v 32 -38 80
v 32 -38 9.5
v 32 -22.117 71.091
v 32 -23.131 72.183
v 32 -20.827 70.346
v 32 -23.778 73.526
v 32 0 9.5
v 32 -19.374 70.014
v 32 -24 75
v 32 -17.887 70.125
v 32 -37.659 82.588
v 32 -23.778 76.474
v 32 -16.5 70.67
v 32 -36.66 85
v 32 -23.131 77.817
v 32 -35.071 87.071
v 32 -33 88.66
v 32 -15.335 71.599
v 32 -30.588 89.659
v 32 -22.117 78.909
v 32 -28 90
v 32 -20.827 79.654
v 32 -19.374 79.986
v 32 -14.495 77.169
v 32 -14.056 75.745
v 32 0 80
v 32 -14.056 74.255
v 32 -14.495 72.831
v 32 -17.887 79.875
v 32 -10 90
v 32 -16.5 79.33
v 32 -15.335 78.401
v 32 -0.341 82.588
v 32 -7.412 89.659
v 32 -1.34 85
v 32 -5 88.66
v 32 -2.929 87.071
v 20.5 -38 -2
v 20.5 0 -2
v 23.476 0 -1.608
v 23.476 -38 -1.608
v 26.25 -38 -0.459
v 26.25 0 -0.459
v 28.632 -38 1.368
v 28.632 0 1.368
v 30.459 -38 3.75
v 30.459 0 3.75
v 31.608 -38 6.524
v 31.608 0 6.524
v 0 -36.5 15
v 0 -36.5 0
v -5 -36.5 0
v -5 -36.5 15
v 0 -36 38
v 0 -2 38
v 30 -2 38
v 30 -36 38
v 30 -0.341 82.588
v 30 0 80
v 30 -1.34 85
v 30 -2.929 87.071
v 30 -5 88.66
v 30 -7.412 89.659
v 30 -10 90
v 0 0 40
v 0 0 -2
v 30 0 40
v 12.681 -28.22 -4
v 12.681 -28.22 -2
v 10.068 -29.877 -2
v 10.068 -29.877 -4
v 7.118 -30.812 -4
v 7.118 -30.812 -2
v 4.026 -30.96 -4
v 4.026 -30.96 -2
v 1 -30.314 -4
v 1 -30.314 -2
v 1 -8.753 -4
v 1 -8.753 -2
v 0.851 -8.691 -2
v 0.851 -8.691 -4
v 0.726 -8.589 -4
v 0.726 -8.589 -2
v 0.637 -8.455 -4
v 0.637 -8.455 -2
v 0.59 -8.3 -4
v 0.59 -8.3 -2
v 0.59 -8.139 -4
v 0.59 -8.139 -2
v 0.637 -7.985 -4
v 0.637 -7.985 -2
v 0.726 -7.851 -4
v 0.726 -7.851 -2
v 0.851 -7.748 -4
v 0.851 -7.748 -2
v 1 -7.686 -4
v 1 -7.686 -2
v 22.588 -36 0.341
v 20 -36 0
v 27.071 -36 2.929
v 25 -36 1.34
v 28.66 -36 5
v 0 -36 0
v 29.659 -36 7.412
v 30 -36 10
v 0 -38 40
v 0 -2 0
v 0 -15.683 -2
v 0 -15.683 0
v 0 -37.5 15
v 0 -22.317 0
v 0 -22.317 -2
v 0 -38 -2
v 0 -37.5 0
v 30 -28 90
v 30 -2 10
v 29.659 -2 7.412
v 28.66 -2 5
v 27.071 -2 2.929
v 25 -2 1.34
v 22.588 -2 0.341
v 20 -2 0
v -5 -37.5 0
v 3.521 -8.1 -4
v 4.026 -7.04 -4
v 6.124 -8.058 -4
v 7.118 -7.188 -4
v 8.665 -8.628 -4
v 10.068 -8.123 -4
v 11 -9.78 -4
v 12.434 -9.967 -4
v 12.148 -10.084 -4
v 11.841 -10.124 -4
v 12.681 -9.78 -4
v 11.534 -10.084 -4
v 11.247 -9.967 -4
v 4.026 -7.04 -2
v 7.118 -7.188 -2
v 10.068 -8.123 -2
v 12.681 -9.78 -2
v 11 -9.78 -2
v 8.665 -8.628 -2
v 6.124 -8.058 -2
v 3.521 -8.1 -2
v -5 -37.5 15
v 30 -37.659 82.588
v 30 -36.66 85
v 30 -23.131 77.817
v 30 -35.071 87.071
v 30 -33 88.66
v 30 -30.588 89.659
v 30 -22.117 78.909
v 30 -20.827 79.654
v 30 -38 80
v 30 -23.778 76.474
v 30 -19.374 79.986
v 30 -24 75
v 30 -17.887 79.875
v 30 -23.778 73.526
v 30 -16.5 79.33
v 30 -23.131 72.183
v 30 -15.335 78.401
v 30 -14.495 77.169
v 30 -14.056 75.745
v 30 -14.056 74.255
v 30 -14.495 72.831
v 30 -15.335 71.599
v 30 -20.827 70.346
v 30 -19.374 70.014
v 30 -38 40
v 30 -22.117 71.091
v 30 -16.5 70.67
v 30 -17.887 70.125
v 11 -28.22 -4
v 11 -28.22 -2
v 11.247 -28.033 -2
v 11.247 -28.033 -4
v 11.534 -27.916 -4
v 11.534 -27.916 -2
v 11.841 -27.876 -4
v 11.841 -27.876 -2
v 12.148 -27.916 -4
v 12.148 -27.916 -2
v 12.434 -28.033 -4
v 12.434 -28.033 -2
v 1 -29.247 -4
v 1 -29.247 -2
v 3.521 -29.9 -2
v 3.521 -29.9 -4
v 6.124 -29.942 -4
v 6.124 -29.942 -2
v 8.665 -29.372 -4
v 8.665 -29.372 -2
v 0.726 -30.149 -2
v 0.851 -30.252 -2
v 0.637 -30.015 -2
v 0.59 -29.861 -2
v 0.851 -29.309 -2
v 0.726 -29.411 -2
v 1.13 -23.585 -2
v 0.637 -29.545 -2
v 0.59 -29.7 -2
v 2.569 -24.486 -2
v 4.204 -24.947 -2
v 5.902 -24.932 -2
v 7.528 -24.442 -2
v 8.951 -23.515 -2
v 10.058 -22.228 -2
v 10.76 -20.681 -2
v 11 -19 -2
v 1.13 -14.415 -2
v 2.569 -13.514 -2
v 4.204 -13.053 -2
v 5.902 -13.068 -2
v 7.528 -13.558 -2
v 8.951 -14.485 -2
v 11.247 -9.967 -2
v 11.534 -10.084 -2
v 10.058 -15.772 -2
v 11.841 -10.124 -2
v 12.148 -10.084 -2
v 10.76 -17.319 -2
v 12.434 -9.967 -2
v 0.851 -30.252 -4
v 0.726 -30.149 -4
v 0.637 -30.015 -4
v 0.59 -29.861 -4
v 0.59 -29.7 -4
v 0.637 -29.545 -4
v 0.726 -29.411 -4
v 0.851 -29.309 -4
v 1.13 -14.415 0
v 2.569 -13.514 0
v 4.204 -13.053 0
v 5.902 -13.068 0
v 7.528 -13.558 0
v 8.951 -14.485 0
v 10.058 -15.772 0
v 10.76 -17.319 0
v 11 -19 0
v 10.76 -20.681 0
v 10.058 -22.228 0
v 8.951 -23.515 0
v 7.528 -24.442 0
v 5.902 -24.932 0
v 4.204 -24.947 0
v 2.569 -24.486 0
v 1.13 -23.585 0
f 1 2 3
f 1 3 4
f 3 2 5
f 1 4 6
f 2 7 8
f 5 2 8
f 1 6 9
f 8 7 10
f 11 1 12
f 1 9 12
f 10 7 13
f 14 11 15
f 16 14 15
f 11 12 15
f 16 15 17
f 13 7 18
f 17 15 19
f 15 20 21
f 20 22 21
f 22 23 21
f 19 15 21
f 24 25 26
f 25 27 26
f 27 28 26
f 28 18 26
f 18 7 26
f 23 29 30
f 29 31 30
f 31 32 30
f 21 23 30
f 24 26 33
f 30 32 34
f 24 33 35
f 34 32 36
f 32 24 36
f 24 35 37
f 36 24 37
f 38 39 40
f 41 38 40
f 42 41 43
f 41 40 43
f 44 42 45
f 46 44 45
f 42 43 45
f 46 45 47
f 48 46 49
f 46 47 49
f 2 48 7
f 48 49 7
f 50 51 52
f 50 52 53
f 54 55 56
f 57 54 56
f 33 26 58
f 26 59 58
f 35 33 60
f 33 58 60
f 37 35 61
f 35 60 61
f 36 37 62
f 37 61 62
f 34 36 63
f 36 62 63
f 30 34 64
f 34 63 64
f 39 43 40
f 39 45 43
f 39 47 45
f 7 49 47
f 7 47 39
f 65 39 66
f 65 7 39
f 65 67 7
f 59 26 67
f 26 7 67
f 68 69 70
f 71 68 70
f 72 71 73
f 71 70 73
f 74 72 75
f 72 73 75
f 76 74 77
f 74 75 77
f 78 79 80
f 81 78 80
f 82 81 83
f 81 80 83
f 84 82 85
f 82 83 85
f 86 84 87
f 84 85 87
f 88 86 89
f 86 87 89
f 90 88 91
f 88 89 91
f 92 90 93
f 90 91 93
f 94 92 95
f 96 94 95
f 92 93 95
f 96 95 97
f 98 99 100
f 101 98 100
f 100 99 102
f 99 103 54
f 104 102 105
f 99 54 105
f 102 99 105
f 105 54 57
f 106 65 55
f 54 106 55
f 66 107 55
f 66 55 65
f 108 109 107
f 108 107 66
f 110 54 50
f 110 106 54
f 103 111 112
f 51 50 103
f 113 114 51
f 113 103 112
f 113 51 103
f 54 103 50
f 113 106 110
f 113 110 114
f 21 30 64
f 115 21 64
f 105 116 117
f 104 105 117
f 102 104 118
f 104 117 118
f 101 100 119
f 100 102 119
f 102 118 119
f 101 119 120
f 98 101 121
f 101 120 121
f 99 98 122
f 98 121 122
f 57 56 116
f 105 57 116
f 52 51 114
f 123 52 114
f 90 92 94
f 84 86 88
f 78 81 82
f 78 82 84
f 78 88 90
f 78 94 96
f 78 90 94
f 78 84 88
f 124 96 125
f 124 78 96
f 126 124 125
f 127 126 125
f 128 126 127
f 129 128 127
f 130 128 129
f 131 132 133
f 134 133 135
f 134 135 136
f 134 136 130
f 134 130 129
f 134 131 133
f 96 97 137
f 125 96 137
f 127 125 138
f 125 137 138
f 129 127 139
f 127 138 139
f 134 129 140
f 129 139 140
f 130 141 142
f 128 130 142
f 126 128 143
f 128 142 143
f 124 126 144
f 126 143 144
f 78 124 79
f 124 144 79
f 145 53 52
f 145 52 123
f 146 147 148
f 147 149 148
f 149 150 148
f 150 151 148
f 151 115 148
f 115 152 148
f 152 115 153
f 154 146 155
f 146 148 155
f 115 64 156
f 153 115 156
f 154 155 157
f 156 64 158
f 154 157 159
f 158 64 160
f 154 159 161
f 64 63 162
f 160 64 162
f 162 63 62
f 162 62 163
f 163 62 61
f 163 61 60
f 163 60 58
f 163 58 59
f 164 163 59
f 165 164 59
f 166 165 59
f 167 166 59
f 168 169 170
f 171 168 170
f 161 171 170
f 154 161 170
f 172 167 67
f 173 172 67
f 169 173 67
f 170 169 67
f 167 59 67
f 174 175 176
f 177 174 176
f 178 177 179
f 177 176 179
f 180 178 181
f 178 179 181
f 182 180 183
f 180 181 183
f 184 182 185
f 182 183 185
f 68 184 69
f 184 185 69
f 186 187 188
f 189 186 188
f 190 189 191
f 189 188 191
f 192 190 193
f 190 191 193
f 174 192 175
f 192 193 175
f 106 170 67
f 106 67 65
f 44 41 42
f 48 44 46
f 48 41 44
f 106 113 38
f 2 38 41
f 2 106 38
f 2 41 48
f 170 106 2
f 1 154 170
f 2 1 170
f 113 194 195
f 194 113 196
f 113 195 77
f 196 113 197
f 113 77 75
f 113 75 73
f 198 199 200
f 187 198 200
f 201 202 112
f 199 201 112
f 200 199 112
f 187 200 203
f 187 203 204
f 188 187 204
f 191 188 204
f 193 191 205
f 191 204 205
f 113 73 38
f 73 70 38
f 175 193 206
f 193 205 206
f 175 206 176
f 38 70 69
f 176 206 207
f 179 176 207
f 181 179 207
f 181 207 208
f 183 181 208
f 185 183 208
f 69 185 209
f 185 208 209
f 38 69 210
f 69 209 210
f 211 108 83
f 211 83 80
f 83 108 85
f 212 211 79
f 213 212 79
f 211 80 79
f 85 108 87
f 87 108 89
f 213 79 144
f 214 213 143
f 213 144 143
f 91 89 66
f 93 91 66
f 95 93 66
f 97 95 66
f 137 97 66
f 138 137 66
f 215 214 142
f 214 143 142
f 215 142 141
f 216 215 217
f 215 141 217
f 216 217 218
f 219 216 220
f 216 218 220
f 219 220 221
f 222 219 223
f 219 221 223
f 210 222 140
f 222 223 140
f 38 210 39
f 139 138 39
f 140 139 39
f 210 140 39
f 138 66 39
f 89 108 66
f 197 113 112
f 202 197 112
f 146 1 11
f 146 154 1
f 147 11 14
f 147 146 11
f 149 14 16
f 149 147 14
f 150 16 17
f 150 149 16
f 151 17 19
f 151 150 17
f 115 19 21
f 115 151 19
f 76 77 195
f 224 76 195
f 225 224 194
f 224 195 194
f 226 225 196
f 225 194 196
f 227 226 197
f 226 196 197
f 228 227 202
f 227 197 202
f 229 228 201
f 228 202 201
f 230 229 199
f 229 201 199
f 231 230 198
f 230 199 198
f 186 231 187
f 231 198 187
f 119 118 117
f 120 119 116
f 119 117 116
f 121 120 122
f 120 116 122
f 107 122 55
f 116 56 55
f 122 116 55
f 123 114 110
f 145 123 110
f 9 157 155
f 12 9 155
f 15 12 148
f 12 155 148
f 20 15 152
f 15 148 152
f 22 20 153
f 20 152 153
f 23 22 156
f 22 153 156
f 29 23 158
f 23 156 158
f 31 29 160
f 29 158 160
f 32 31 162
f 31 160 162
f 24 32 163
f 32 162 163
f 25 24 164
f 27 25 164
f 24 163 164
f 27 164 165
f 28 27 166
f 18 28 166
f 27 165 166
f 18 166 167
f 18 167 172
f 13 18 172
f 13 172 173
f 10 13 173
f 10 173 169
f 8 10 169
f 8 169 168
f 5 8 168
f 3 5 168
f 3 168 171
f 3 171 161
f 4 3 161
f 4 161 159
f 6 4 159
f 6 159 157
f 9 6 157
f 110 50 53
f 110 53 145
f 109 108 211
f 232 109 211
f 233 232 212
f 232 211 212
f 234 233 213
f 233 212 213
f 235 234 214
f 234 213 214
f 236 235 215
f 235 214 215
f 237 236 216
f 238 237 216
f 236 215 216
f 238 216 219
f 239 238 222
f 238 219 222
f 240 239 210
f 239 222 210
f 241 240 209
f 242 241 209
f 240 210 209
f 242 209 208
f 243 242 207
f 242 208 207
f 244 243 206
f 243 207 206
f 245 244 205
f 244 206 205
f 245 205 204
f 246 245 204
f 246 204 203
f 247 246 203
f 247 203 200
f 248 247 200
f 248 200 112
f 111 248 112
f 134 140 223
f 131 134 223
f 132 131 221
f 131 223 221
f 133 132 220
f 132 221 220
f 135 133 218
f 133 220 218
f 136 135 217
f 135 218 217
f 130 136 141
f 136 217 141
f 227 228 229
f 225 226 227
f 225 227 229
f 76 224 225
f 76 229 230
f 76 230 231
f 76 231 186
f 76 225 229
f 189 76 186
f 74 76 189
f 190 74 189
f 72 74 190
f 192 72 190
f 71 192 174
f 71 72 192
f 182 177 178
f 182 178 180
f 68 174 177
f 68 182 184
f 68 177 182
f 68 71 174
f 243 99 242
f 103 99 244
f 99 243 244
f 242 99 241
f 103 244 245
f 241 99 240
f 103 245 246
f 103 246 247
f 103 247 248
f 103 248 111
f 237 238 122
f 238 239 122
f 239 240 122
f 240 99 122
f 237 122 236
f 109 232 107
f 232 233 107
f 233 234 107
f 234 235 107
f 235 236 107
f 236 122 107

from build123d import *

# Parameters (mm, degrees)
F1_DEPTH  = 38
F3_D      = 12
F5_DEPTH  = 2
F6_R      = 10
F8_D      = 10
F10_DEPTH = 2
F12_DEPTH = 2
F14_W     = 30
F14_H     = 36
F15_DEPTH = 2
F16_W     = 1
F16_H     = 15
F17_DEPTH = 5


# Not quite as in the source:
# - a feature names something its author has since deleted; it is built from what else it names


with BuildPart() as f1:
    # F0 (on Front) → F1 (new body)
    with BuildSketch(Plane.XZ):
        with BuildLine():
            Line((20, 0), (0, 0))
            Line((0, 0), (0, -2))
            Line((0, -2), (20.5, -2))
            ThreePointArc((20.5, -2), (28.6317279836, 1.3682720164), (32, 9.5))
            Line((32, 9.5), (32, 90))
            Line((32, 90), (30, 90))
            Line((30, 90), (30, 10))
            ThreePointArc((30, 10), (27.0710678119, 2.9289321881), (20, 0))
        make_face()
    extrude(amount=F1_DEPTH)

    # F3 (through all)
    with Locations(Plane.XY):
        with Locations((5, -19)):
            Hole(F3_D / 2)

    # F4 (on face) → F5 (join)
    with BuildSketch(Plane(origin=(0, 0, -2), x_dir=(1, 0, 0), z_dir=(0, 0, -1))):
        with BuildLine():
            ThreePointArc((1, 29.246950766), (6.1242290384, 29.9423996029), (11, 28.2195444573))
            ThreePointArc((11, 28.2195444573), (11.8405728739, 27.8759539642), (12.6811457479, 28.2195444573))
            ThreePointArc((12.6811457479, 28.2195444573), (7.117566826, 30.811685347), (1, 30.313708499))
            ThreePointArc((1, 30.313708499), (0.5841901068, 29.7803296325), (1, 29.246950766))
        make_face()
        with BuildLine():
            ThreePointArc((11, 9.7804555427), (6.1242290384, 8.0576003971), (1, 8.753049234))
            ThreePointArc((1, 8.753049234), (0.5841901068, 8.2196703675), (1, 7.686291501))
            ThreePointArc((1, 7.686291501), (7.117566826, 7.188314653), (12.6811457479, 9.7804555427))
            ThreePointArc((12.6811457479, 9.7804555427), (11.8405728739, 10.1240460358), (11, 9.7804555427))
        make_face()
    extrude(amount=F5_DEPTH)

    # F6
    f6_edges = [f1.edges().sort_by_distance(p)[0] for p in [
        (31, -38, 90),
        (31, 0, 90),
    ]]
    fillet(f6_edges, radius=F6_R)

    # F8 (through all)
    with Locations(Plane.YZ.offset(32)):
        with Locations((-19, 75)):
            Hole(F8_D / 2)


with BuildPart() as f10:
    # F9 (on face) → F10 (new body)
    with BuildSketch(Plane.XZ.offset(38)):
        with BuildLine():
            Line((0, 40), (0, 0))
            Line((0, 0), (20, 0))
            ThreePointArc((20, 0), (27.0710678119, 2.9289321881), (30, 10))
            Line((30, 10), (30, 40))
            Line((30, 40), (0, 40))
        make_face()
    extrude(amount=-F10_DEPTH)


with BuildPart() as f12:
    # F11 (on face) → F12 (new body)
    with BuildSketch(Plane(origin=(0, 0, 0), x_dir=(-1, 0, 0), z_dir=(0, 1, 0))):
        with BuildLine():
            Line((-20, 0), (0, 0))
            Line((0, 0), (0, 40))
            Line((0, 40), (-30, 40))
            Line((-30, 40), (-30, 10))
            ThreePointArc((-30, 10), (-27.0710678119, 2.9289321881), (-20, 0))
        make_face()
    extrude(amount=-F12_DEPTH)


with BuildPart() as f1_1:
    add(f1.part)

    # F13: union F10, F12
    add(f10.part)
    add(f12.part)

    # F14 (on face) → F15 (join)
    with BuildSketch(Plane.XY.offset(40)):
        with Locations((15, -20)):
            Rectangle(F14_W, F14_H)
    extrude(amount=-F15_DEPTH)

    # F16 (on face) → F17 (join)
    with BuildSketch(Plane(origin=(0, 0, 0), x_dir=(0, -1, 0), z_dir=(-1, 0, 0))):
        with Locations((37, 7.5)):
            Rectangle(F16_W, F16_H)
    extrude(amount=F17_DEPTH)


solid = f1_1.part
